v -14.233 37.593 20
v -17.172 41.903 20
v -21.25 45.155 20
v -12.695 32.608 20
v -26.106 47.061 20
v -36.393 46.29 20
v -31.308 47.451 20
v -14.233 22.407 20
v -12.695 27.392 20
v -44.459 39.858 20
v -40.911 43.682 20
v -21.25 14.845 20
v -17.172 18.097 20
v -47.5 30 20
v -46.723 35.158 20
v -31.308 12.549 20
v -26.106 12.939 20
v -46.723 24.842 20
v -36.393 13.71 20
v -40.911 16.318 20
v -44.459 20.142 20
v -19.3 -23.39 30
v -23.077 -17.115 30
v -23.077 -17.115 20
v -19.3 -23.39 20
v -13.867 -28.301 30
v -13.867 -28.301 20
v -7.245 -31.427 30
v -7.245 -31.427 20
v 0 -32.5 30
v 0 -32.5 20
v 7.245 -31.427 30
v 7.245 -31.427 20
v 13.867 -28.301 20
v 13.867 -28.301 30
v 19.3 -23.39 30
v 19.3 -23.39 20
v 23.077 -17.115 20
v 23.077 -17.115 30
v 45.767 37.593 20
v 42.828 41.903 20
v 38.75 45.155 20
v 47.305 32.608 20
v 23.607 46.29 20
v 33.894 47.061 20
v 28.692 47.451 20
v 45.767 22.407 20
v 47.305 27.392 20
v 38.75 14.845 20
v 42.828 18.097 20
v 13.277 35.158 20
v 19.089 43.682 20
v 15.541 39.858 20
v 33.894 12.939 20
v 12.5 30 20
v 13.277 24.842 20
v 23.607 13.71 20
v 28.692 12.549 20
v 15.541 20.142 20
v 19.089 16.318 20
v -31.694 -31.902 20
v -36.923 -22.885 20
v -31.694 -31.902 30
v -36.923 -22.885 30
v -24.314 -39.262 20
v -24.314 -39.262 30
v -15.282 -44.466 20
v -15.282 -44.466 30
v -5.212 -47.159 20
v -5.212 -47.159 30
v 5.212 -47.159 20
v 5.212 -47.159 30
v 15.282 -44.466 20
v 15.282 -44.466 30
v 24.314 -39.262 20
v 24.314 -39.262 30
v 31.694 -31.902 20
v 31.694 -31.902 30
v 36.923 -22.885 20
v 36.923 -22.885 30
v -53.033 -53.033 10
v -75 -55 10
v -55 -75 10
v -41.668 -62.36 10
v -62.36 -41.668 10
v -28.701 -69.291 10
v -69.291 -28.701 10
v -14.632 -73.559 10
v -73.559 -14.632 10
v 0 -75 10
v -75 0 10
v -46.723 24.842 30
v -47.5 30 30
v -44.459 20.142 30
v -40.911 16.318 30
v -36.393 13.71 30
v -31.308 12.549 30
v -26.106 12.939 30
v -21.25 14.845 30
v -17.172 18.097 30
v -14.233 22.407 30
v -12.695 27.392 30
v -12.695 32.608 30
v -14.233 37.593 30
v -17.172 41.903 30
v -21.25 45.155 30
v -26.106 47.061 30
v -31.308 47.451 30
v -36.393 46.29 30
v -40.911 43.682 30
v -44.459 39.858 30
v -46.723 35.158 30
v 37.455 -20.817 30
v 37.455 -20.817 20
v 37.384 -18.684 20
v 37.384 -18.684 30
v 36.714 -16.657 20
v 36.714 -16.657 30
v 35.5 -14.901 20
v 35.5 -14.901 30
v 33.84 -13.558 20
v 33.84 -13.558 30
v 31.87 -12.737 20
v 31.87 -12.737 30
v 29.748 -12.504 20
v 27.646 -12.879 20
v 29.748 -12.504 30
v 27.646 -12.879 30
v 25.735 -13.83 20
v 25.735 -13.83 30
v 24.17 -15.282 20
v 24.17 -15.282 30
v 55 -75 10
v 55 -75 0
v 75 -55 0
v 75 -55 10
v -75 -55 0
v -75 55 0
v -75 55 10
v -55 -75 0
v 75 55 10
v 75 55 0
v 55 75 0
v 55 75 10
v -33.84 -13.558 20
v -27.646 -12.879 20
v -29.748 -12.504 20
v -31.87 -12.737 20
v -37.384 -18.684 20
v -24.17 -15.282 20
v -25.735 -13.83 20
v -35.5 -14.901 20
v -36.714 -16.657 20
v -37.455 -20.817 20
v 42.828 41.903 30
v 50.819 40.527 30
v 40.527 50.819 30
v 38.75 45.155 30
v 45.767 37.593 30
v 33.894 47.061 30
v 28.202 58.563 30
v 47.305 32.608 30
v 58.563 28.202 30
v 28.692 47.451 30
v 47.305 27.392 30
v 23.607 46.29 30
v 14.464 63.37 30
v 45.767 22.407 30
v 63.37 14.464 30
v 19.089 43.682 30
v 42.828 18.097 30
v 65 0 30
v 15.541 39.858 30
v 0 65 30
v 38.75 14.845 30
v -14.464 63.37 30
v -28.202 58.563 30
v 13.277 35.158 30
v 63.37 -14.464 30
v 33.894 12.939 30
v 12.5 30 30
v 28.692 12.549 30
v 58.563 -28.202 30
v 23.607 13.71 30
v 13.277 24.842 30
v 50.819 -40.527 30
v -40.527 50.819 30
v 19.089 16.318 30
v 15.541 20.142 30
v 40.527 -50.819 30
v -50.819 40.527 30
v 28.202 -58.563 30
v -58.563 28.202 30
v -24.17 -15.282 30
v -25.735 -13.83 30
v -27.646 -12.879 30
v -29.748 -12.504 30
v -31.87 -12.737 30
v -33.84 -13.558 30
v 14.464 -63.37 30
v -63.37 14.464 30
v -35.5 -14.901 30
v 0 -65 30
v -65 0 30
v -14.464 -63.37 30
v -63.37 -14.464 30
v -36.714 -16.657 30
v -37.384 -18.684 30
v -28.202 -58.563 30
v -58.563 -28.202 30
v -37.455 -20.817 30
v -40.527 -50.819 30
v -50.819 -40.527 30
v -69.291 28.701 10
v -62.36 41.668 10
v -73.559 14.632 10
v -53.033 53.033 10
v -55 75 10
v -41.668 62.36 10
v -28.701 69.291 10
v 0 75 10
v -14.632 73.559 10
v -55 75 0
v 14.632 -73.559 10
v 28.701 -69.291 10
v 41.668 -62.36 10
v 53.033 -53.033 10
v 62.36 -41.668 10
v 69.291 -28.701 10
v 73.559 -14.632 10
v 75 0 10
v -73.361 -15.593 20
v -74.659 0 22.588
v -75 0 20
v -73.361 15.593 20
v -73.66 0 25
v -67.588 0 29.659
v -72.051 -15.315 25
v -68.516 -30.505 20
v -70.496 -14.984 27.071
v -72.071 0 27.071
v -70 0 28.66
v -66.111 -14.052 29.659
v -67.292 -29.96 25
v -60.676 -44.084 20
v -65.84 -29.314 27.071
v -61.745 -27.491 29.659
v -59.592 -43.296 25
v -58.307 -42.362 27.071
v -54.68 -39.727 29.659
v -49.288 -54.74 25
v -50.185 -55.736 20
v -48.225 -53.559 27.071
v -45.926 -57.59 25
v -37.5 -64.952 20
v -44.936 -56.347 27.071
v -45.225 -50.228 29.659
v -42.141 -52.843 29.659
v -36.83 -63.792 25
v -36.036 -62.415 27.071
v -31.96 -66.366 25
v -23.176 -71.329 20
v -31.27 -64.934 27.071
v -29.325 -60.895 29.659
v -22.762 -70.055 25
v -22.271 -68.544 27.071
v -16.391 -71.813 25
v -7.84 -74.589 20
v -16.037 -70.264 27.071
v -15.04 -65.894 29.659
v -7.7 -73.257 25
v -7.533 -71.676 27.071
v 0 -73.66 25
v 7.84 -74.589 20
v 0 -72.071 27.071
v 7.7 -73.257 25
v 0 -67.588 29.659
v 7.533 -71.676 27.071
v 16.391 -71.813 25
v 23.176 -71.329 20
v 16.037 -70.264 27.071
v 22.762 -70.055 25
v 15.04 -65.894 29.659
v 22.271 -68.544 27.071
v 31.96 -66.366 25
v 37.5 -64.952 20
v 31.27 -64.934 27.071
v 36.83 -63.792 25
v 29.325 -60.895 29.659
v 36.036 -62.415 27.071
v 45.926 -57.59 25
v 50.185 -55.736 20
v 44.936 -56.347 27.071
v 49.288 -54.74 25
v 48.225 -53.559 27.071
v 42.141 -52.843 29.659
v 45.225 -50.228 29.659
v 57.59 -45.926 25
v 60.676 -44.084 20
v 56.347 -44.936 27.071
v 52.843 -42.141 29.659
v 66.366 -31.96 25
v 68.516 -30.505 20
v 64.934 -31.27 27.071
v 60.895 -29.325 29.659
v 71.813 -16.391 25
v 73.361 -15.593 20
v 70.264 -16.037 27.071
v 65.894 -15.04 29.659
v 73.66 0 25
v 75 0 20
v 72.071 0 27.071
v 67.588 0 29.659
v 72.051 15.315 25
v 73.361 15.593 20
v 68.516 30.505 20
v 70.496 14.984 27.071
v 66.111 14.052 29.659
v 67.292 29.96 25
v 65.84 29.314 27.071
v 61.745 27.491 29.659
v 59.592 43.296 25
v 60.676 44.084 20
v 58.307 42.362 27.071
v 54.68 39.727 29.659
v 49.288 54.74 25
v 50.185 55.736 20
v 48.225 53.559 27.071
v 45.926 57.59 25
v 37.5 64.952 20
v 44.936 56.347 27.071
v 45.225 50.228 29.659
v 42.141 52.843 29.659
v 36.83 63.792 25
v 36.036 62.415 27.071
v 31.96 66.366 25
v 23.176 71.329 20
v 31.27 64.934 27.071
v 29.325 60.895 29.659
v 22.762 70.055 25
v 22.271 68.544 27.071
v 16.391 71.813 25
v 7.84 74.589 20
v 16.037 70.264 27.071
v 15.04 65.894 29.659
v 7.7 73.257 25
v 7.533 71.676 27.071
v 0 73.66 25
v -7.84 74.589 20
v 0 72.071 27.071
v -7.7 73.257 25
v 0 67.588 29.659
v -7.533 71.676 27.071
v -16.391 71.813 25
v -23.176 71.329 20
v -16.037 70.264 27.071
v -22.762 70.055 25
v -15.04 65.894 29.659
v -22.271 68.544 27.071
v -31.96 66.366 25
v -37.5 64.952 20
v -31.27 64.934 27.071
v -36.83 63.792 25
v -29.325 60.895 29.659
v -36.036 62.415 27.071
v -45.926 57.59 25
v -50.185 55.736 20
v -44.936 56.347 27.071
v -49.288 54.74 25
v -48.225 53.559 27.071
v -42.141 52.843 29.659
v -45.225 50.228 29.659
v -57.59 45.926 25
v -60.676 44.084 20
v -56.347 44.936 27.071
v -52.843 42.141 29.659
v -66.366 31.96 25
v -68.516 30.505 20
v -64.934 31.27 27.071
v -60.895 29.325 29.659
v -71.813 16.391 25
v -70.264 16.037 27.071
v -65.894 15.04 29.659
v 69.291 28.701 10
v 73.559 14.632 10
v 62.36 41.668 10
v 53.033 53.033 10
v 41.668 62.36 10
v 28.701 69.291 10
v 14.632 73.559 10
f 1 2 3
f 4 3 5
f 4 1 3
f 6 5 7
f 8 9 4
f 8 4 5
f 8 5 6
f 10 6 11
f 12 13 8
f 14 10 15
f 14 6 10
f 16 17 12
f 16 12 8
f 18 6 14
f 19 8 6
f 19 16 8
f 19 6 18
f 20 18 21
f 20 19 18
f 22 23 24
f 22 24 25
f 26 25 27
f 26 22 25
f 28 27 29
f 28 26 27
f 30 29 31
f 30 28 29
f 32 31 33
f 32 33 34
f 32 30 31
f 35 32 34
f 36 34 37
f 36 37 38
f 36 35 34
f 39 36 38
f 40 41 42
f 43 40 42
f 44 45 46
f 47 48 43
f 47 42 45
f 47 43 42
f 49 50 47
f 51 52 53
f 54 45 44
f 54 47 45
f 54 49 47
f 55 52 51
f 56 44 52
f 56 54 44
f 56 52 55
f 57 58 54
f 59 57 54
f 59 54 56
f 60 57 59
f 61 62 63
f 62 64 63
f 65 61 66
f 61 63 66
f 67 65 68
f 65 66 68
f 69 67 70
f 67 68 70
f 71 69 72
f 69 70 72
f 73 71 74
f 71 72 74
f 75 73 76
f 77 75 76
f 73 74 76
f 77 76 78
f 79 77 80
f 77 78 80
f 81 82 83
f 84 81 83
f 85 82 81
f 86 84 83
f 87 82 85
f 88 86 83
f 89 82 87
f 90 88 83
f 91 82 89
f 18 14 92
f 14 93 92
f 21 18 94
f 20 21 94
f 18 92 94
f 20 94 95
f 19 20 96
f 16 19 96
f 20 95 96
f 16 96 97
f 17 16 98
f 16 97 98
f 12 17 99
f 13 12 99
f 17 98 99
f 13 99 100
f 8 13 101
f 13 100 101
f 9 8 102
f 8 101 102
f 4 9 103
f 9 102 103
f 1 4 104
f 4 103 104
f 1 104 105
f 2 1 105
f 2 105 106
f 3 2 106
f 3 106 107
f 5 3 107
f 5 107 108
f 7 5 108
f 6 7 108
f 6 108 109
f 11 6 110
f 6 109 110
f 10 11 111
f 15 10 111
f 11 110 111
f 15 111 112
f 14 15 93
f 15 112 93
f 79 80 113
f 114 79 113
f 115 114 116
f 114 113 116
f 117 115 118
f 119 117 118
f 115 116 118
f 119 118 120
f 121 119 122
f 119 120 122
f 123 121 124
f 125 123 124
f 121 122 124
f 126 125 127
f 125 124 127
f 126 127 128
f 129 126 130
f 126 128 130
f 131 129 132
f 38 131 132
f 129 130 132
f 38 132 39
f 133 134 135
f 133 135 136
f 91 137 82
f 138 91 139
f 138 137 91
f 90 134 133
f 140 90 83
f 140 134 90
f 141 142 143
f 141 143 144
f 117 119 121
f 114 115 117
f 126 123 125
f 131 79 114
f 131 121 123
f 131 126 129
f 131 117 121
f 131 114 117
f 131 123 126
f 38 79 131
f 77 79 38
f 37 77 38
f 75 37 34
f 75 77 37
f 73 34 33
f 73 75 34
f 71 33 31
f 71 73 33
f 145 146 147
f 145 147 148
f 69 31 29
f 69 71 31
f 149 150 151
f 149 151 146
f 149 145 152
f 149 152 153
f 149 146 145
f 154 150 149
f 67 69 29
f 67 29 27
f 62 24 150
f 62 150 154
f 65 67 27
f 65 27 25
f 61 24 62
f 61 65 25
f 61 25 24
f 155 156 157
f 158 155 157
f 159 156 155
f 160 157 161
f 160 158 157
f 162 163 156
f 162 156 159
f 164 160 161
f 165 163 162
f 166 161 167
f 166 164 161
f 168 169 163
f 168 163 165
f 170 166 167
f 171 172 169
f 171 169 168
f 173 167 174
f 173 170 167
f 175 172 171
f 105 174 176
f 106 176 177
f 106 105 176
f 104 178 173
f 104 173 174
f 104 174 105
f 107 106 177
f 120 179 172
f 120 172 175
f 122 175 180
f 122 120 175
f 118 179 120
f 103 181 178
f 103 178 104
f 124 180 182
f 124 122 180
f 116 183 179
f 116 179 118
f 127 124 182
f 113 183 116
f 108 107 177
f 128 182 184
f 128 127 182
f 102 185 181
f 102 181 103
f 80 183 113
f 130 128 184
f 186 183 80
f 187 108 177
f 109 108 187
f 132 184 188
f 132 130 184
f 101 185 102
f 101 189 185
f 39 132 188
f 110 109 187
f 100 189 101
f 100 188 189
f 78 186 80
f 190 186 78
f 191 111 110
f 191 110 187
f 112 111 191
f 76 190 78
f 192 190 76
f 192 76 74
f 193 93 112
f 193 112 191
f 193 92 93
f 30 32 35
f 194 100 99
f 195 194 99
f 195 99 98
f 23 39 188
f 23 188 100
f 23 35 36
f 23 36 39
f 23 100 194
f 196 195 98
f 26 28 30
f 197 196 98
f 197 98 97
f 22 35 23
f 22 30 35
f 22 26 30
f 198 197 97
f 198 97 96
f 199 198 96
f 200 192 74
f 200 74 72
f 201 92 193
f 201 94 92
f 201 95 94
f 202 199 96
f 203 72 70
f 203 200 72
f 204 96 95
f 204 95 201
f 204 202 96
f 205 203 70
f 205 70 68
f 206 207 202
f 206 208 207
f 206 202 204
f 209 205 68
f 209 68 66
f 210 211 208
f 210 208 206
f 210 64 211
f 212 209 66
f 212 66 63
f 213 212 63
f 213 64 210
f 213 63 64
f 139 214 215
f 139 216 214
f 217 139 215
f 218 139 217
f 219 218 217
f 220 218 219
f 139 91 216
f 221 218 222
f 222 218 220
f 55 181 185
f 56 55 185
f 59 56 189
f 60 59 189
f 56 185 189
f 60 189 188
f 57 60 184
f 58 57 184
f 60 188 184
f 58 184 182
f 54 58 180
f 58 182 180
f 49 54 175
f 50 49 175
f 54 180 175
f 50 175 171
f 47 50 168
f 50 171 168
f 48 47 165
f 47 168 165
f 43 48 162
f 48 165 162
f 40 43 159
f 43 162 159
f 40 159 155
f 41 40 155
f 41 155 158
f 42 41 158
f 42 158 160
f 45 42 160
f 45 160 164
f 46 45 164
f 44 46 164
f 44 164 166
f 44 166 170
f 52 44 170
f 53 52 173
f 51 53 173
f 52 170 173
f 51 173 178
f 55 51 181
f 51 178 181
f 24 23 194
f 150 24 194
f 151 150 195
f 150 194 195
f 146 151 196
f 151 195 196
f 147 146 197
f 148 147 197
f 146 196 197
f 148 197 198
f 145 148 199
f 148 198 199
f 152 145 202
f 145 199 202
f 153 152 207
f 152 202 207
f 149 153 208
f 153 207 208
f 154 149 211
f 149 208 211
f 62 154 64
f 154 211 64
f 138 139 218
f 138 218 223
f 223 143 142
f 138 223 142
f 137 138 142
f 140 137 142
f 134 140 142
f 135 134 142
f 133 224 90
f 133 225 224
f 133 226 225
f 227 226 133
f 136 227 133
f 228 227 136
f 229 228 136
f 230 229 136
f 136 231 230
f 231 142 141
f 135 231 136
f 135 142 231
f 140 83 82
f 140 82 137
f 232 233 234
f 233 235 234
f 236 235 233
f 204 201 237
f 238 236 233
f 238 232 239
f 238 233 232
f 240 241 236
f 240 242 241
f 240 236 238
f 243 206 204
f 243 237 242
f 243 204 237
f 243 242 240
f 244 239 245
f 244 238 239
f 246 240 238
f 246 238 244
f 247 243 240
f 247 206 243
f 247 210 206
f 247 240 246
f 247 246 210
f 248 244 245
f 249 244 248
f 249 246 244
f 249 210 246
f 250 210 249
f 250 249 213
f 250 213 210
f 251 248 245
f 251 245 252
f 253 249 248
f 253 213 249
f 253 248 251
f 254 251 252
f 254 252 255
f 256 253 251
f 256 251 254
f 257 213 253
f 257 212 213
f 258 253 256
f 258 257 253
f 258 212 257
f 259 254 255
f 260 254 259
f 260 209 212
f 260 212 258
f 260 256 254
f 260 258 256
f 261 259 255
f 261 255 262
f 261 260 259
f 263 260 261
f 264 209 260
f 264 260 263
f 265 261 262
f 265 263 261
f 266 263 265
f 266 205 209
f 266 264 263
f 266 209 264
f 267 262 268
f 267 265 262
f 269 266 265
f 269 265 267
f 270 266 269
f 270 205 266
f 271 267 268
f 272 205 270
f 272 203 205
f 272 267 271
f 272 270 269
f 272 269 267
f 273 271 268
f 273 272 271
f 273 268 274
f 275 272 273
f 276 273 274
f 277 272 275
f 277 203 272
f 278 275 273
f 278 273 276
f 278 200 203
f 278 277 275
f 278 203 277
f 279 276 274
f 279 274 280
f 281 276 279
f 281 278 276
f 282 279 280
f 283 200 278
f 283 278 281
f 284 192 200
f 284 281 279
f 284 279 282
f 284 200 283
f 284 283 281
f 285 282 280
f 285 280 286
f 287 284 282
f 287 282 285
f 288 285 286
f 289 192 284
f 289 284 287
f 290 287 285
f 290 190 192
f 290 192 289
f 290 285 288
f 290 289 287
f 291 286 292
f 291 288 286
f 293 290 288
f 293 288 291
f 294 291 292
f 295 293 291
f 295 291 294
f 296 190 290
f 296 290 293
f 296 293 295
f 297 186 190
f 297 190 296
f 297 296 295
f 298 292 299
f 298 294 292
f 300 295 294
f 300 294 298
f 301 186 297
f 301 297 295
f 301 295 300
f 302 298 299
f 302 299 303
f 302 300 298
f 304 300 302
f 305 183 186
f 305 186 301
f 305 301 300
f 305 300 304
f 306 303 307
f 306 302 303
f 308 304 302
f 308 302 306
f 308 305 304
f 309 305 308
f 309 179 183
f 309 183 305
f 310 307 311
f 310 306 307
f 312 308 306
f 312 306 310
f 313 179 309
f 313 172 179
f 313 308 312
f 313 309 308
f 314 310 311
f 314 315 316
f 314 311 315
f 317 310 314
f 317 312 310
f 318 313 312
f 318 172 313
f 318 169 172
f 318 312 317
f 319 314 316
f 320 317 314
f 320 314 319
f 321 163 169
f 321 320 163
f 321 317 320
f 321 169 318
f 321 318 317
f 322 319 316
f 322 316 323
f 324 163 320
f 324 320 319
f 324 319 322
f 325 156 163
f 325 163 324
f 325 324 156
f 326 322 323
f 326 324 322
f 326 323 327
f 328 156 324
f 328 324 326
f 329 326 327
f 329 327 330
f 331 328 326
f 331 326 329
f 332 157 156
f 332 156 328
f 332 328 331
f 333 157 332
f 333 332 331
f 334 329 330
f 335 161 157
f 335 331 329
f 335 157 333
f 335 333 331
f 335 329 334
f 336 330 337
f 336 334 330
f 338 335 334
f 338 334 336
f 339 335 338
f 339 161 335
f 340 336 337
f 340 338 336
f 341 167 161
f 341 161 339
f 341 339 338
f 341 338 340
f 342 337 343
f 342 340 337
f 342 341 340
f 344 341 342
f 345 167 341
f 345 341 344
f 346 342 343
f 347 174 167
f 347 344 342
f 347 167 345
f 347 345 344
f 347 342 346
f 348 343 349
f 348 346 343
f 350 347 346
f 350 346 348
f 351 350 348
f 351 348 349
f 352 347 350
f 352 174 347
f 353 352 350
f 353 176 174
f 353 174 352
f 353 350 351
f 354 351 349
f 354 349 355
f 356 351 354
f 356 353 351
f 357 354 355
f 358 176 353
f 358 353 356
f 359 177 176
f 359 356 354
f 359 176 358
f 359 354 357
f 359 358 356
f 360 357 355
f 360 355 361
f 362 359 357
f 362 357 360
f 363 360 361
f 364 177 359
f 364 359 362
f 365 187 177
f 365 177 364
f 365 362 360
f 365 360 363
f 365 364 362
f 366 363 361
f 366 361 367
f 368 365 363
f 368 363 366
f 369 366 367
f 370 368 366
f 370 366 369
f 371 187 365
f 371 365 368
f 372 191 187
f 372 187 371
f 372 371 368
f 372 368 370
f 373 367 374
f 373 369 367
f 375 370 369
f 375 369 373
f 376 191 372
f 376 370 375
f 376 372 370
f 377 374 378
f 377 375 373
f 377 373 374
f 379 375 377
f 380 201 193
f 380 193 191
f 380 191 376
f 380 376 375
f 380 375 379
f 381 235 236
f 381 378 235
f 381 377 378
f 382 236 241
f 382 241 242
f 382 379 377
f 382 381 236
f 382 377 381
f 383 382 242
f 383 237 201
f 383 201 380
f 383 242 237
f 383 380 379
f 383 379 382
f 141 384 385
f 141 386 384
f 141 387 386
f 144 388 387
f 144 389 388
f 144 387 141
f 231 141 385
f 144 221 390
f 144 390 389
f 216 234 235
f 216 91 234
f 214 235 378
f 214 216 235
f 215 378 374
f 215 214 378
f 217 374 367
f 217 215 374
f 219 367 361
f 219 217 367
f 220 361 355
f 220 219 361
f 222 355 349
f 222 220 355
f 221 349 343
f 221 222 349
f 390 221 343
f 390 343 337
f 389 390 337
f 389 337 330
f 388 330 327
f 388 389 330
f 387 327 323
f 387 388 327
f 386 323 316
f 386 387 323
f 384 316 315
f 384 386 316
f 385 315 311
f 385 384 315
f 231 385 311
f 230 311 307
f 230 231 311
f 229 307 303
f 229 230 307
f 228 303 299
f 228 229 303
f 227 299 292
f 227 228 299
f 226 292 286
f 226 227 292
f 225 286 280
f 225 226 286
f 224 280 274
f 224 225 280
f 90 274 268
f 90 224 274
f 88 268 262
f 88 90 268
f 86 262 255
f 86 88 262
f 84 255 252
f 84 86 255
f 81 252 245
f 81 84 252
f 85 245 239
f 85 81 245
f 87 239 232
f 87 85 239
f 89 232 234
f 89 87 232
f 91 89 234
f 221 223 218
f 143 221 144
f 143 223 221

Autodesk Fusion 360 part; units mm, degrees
sketch "Sketch1" plane through (0, 0, 0) normal (0, 0, 1) x (1, 0, 0)
  line L0 (-75, 75) -> (75, 75)
  line L1 (75, 75) -> (75, -75)
  line L2 (75, -75) -> (-75, -75)
  line L3 (-75, -75) -> (-75, 75)
  line L4 (-75, 75) -> (75, -75) construction
  line L5 (75, 75) -> (-75, -75) construction
  dimension "d1" = 150
  dimension "d2" = 150
extrude "Extrude1" add sketch "Sketch1" along normal blind 10
sketch "Sketch2" plane through (0, 0, 10) normal (0, 0, 1) x (-1, 0, 0)
  line L0 (75, 75) -> (-75, 75)
  line L1 (-75, 75) -> (-75, -75)
  line L2 (-75, -75) -> (75, -75)
  line L3 (75, -75) -> (75, 75)
  circle A0 centre (0, 0) radius 75
extrude "Extrude2" add sketch "Sketch2" along normal blind 20 contours A0
sketch "Sketch3" plane through (0, 0, 30) normal (0, 0, 1) x (-1, 0, 0)
  circle A0 centre (0, 0) radius 75
  circle A1 centre (-30, -30) radius 17.5
  line L0 (0, -2.5) -> (0, -20)
  circle A2 centre (30, -30) radius 17.5
  arc A3 (36.9231, 22.8846) -> (-36.9231, 22.8846) centre (0, 7.5) ccw
  arc A4 (23.0769, 17.1154) -> (36.9231, 22.8846) centre (30, 20) ccw
  arc A5 (23.0769, 17.1154) -> (-23.0769, 17.1154) centre (0, 7.5) ccw
  arc A6 (-36.9231, 22.8846) -> (-23.0769, 17.1154) centre (-30, 20) ccw
  arc A7 (30, 20) -> (-30, 20) centre (0, 7.5) ccw construction
  dimension "d7" = 35
  dimension "d8" = 15
extrude "Extrude3" cut sketch "Sketch3" against normal blind 10 contours A1 | A2 | A3 A4 A5 A6
chamfer "Chamfer1" distance 20 angle 45 4 edges at (75, 75, 5) (75, -75, 5) (-75, -75, 5) (-75, 75, 5)
fillet "Fillet1" radius 10 1 edges at (69.9246, 27.1212, 30)
